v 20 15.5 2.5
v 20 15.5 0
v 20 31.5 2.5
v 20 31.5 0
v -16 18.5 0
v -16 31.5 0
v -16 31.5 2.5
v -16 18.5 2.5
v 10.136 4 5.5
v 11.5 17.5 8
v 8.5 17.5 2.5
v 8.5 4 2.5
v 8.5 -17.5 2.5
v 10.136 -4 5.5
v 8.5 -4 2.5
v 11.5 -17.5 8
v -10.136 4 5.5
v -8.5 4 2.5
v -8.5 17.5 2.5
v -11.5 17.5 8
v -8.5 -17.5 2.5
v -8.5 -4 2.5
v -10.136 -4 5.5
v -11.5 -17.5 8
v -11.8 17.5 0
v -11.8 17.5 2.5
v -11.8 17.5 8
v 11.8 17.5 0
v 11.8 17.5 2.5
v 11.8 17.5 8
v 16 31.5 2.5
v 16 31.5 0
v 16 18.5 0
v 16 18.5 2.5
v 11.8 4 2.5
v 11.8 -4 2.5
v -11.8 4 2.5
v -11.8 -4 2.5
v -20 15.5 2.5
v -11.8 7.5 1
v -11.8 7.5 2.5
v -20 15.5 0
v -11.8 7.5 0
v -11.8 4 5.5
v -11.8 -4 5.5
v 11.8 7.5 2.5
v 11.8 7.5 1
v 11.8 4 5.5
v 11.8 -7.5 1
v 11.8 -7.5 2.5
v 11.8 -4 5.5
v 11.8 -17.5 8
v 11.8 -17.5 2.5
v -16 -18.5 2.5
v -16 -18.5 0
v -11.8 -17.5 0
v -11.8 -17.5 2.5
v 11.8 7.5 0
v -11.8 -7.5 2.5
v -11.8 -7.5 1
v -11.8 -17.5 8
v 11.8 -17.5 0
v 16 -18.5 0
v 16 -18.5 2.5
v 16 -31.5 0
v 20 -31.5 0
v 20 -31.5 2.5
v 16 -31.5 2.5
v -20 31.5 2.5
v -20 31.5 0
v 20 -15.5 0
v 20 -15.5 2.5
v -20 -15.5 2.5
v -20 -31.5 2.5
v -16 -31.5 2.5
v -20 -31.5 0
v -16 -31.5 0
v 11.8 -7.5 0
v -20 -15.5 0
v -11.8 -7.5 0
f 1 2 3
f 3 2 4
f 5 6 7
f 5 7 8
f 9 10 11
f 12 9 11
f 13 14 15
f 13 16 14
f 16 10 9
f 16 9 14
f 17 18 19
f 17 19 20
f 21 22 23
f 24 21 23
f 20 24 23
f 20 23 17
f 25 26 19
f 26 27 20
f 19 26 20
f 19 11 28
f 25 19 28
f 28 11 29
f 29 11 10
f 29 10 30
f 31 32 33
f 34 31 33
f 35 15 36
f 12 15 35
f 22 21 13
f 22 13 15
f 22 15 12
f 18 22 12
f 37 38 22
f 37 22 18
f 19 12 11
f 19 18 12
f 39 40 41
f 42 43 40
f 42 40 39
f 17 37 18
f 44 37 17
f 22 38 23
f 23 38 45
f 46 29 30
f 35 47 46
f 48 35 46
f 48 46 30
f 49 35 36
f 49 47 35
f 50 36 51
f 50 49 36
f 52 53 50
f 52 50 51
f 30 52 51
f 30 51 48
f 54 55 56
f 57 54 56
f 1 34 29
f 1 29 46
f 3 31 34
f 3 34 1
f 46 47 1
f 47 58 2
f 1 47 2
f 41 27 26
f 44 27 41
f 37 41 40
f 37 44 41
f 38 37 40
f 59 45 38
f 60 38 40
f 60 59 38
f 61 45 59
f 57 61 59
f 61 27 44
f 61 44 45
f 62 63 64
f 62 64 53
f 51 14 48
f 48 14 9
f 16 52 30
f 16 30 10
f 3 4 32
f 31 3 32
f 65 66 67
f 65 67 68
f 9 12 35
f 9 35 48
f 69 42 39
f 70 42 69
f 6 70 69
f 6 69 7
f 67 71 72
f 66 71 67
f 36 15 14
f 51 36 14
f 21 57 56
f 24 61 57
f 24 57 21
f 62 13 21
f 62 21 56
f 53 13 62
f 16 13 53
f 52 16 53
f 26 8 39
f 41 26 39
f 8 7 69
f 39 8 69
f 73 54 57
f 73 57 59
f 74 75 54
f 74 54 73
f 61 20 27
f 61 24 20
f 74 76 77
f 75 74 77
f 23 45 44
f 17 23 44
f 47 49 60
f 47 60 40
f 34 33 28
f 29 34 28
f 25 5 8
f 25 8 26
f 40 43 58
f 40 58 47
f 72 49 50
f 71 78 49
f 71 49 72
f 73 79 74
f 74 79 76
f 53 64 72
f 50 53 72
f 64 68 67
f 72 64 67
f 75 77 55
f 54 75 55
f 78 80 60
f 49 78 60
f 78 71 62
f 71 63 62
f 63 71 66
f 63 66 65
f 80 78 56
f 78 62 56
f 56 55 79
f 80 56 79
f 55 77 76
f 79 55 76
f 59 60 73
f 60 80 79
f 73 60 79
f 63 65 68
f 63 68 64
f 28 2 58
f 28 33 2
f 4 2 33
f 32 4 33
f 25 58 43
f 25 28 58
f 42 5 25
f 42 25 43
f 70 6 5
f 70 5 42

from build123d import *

# Parameters (mm, degrees)
F1_DEPTH         = 17.5
F2_W             = 8
F2_H             = 3
F2_W_2           = 15
F2_H_2           = 1
F3_DEPTH         = 50
F5_DEPTH         = 2.5
F5_COPIES2_COUNT = 2


# Not quite as in the source:
# - a pattern or mirror of a feature is missing from the dataset's text; its kind, count and spacing are read off the source's solid


with BuildPart() as f1:
    # F0 (on Front) → F1 (new body, symmetric)
    with BuildSketch(Plane.XZ):
        Polygon((-11.8, 0), (0, 0), (11.8, 0), (11.8, 8), (11.5, 8), (8.5, 2.5), (0, 2.5), (-8.5, 2.5), (-11.5, 8), (-11.8, 8), align=None)
    extrude(amount=F1_DEPTH, both=True)

    # F2 (on Right) → F3 (cut, symmetric)
    with BuildSketch(Plane.YZ):
        with Locations((0, 4)):
            Rectangle(F2_W, F2_H)
        with Locations((0, 0.5)):
            Rectangle(F2_W_2, F2_H_2)
    extrude(amount=F3_DEPTH, both=True, mode=Mode.SUBTRACT)

    # F4 (on Top) → F5 (join)
    with BuildSketch(Plane.XY):
        Polygon((16, 18.5), (11.8, 17.5), (11.8, 7.5), (20, 15.5), (20, 31.5), (16, 31.5), align=None)
    f5 = extrude(amount=F5_DEPTH)

    # F5_copies: F5 across plane
    add(f5.mirror(Plane(origin=(0, 0, 0), x_dir=(0, 0, -1), z_dir=(-1, 0, 0))))

    # F5_copies1: F5 across plane
    add(f5.mirror(Plane(origin=(0, 0, 0), x_dir=(0, 0, -1), z_dir=(0, -1, 0))))

    # F5_copies2: F5 ×2 about axis
    f5_copies2_axis = Axis((0, 0, 0), (0, 0, 1))
    for i in range(1, F5_COPIES2_COUNT):
        add(f5.rotate(f5_copies2_axis, i * 360 / F5_COPIES2_COUNT))


solid = f1.part
